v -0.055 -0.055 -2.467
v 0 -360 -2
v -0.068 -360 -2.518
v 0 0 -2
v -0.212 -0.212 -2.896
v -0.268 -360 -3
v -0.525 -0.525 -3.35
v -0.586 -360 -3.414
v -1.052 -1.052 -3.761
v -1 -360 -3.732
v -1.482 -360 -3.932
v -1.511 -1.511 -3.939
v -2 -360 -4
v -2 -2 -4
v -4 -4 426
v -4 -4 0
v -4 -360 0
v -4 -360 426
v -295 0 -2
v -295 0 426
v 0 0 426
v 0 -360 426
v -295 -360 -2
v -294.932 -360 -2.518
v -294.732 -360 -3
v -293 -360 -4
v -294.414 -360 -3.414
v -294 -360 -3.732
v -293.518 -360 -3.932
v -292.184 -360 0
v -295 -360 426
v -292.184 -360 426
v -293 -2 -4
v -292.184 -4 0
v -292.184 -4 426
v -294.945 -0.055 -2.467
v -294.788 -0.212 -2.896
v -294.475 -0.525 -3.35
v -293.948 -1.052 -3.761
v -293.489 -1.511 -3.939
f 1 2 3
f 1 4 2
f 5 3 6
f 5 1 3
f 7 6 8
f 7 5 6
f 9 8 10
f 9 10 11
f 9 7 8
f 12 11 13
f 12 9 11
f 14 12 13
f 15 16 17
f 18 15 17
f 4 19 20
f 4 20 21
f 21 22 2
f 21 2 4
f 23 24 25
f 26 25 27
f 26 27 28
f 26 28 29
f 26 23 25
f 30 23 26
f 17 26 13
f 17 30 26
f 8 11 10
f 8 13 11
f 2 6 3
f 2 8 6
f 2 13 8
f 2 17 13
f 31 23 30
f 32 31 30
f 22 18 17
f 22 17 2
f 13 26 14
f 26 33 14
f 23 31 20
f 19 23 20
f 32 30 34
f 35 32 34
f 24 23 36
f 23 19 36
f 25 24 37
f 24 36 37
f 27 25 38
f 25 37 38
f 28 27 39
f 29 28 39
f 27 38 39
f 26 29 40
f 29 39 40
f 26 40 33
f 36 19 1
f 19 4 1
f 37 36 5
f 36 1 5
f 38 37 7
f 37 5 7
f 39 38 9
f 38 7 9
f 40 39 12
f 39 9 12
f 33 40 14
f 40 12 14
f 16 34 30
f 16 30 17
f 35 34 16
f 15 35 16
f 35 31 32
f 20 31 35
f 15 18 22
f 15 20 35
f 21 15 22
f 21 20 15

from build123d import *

# Parameters (mm, degrees)
F1_DEPTH = 426
F2_W     = 295
F2_H     = 360
F3_DEPTH = 4
F4_R     = 2


# Not quite as in the source:
# - a feature names something its author has since deleted; it is built from what else it names


with BuildPart() as f1:
    # F0 (on Top) → F1 (new body)
    with BuildSketch(Plane.XY):
        Polygon((-4, -360), (0, -360), (0, 0), (-295, 0), (-295, -360), (-292.1838745495, -360), (-292.1838745495, -4), (-4, -4), align=None)
    extrude(amount=F1_DEPTH)

    # F2 (on Top) → F3 (join)
    with BuildSketch(Plane.XY):
        with Locations((-147.5, -180)):
            Rectangle(F2_W, F2_H)
    extrude(amount=-F3_DEPTH)

    # F4
    f4_edges = [f1.edges().sort_by_distance(p)[0] for p in [
        (0, -180, -4),
        (-295, -180, -4),
        (-147.5, 0, -4),
    ]]
    fillet(f4_edges, radius=F4_R)


solid = f1.part
